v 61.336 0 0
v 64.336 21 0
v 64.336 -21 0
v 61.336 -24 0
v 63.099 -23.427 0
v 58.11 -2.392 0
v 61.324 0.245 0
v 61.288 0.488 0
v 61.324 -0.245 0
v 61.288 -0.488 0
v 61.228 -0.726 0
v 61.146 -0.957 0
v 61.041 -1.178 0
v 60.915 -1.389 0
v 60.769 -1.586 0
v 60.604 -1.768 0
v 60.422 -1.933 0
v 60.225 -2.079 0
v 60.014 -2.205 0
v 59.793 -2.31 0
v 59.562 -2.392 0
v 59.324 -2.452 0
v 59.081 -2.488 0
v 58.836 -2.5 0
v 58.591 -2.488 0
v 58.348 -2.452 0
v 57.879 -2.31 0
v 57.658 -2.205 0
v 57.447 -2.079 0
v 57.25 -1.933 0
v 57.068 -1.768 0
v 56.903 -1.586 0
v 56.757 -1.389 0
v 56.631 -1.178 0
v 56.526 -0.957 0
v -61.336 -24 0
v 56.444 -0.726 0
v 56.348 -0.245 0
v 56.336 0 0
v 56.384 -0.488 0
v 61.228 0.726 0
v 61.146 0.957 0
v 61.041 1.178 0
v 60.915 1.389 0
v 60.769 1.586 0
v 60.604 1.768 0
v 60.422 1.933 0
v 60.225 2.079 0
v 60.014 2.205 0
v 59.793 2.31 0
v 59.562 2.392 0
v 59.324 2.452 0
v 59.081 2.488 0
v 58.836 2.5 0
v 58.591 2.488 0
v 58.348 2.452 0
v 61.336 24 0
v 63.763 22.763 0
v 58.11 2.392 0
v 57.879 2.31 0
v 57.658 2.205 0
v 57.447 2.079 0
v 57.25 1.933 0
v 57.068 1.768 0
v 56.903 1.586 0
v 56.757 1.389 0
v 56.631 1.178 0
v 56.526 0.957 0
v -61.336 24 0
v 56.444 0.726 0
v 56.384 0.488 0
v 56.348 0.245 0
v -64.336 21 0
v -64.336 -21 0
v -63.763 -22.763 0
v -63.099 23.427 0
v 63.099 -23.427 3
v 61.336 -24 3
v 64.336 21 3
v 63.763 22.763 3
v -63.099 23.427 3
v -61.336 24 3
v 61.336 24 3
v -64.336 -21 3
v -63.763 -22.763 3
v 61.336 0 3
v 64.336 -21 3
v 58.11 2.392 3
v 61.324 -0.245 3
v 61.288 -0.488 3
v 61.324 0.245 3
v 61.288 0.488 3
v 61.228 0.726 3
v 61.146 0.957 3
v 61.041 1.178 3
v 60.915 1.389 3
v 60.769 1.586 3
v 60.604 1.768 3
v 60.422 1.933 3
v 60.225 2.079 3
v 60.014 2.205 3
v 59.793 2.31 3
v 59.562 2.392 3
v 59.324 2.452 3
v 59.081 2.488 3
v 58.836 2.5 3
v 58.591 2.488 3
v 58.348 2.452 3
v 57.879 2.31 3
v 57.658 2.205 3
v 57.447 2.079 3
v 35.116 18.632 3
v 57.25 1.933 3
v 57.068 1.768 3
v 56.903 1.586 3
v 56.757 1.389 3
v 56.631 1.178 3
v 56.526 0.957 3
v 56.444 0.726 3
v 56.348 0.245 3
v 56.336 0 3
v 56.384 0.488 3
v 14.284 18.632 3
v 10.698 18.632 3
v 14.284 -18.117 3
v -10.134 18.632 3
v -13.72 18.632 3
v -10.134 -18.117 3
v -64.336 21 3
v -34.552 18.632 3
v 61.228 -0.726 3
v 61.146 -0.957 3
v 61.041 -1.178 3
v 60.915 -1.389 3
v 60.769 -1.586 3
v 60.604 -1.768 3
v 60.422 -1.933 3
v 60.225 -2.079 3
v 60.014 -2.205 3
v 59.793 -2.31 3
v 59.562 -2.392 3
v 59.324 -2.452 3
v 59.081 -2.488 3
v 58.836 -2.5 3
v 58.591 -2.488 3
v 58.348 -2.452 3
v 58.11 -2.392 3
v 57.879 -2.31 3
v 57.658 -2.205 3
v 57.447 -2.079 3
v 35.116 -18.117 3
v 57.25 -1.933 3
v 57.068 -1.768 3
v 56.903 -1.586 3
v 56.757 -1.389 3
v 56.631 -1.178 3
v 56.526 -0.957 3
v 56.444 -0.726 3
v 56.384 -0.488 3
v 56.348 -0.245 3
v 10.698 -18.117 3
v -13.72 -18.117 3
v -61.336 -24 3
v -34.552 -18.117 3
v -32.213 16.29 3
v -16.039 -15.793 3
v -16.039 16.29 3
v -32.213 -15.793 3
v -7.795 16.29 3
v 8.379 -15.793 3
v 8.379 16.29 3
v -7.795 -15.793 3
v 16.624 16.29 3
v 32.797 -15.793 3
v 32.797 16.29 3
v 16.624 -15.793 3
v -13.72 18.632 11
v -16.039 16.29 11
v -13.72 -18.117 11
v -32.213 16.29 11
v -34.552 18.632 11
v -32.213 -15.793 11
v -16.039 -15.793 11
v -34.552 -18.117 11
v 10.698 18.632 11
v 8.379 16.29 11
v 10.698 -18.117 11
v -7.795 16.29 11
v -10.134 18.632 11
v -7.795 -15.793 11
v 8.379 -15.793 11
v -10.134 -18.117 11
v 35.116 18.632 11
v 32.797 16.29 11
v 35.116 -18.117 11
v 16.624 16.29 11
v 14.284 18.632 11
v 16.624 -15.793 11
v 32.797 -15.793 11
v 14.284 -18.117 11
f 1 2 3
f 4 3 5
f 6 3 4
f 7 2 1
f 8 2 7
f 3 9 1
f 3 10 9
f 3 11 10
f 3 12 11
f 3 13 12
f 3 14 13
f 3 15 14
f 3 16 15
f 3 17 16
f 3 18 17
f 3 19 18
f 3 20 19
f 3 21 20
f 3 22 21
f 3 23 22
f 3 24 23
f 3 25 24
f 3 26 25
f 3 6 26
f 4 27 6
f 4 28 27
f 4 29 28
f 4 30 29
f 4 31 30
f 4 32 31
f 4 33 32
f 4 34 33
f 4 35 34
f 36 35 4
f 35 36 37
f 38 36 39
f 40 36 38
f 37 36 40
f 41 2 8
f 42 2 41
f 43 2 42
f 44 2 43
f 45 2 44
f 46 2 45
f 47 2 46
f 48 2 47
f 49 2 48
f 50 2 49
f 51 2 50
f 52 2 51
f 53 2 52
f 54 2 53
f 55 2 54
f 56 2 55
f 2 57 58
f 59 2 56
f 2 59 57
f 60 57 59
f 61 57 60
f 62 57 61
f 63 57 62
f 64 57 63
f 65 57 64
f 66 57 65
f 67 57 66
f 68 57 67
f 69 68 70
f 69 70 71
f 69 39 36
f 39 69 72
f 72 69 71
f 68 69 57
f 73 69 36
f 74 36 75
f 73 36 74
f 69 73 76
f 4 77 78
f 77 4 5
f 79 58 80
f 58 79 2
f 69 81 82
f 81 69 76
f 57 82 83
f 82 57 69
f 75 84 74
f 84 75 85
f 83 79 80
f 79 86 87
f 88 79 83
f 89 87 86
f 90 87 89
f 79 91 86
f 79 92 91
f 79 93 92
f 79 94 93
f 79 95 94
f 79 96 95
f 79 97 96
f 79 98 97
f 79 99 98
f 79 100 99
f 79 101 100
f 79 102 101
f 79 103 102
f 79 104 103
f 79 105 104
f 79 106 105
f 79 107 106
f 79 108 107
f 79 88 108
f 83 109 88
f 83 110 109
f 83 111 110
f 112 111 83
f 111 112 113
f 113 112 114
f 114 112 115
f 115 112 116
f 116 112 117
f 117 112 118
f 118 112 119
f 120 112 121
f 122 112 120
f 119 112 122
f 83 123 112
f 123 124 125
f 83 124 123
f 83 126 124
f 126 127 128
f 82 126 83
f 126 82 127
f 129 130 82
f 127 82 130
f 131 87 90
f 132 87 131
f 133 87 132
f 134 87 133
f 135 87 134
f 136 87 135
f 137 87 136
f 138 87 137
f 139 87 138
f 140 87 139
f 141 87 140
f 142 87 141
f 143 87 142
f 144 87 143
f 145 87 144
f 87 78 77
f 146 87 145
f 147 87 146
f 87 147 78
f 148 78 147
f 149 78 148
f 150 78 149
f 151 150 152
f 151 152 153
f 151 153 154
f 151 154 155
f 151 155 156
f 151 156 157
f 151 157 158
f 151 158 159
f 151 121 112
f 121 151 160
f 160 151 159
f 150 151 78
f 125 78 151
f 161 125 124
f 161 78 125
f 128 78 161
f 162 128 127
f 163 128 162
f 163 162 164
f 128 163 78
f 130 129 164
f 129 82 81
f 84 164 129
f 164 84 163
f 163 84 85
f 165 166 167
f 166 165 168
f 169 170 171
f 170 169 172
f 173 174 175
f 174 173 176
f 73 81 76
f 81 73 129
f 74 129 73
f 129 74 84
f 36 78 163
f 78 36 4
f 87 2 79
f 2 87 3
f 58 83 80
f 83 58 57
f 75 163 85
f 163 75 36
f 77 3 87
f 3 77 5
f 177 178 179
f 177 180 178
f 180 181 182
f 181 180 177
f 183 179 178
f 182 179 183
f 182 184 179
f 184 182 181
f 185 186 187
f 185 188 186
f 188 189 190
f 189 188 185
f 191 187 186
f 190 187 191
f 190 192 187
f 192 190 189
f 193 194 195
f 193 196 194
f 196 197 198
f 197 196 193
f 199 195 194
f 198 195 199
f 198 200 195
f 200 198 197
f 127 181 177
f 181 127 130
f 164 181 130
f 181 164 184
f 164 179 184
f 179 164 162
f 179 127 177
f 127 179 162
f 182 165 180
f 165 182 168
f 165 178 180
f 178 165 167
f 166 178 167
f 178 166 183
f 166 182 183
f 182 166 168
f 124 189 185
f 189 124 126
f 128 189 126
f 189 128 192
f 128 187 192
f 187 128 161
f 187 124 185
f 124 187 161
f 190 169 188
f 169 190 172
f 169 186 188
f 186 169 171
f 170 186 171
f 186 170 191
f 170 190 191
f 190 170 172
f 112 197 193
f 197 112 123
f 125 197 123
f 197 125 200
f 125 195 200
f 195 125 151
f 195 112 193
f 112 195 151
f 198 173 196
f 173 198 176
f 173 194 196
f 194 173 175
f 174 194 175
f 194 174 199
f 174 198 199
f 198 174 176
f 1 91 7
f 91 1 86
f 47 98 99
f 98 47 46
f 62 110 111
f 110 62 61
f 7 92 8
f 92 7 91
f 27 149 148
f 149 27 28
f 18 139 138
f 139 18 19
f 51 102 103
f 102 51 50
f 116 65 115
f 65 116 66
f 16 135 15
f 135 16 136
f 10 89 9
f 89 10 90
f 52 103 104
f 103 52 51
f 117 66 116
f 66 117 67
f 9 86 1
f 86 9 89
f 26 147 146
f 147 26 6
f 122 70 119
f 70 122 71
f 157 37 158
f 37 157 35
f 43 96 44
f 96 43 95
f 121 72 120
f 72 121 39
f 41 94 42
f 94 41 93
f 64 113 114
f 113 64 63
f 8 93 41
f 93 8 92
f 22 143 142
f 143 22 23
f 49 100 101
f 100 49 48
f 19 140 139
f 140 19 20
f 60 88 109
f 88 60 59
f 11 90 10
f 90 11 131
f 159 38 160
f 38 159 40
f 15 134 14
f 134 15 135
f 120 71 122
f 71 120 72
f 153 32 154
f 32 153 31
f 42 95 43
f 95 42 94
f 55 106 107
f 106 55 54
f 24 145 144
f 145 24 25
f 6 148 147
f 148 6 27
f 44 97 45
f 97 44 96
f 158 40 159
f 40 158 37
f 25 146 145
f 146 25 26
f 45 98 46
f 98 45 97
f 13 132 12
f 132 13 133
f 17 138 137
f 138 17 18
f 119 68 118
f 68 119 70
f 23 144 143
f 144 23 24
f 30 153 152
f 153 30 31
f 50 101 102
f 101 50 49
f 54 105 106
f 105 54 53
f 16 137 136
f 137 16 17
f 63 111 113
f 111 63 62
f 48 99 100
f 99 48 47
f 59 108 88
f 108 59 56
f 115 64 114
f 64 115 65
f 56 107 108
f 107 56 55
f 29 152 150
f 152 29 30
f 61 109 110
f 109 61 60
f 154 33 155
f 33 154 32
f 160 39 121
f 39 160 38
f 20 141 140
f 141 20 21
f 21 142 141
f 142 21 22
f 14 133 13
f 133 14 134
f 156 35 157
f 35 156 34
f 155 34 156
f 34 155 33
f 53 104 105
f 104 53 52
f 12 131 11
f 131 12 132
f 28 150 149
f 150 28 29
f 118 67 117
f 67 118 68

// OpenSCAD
// 由 scripts/make_text3d.py 生成 —— 改完可直接 scad_build.py 重编译
// 文字只在这里写一遍；底板尺寸是脚本量出文字包围盒后算好的明确数字
// 模式：平放
text_str  = "苗白菜";
font_name = "Hiragino Sans GB";
size_mm   = 30.0;
height_mm = 8.0;
base_mm   = 3.0;
pad_mm    = 5.0;
hole_mm   = 5.0;
base_w    = 128.6721;
base_h    = 48.0001;

difference() {
  union() {
  linear_extrude(3.0)
    offset(r = 3) square([122.6721, 42.0001], center = true);
  translate([0, 0, 3.0])
    linear_extrude(8.0)
      text(text_str, size = size_mm, font = font_name, halign = "center", valign = "center");
  }
  translate([58.8360, 0, -1])
    cylinder(d = 5.0, h = 5.0, $fn = 64);
}
